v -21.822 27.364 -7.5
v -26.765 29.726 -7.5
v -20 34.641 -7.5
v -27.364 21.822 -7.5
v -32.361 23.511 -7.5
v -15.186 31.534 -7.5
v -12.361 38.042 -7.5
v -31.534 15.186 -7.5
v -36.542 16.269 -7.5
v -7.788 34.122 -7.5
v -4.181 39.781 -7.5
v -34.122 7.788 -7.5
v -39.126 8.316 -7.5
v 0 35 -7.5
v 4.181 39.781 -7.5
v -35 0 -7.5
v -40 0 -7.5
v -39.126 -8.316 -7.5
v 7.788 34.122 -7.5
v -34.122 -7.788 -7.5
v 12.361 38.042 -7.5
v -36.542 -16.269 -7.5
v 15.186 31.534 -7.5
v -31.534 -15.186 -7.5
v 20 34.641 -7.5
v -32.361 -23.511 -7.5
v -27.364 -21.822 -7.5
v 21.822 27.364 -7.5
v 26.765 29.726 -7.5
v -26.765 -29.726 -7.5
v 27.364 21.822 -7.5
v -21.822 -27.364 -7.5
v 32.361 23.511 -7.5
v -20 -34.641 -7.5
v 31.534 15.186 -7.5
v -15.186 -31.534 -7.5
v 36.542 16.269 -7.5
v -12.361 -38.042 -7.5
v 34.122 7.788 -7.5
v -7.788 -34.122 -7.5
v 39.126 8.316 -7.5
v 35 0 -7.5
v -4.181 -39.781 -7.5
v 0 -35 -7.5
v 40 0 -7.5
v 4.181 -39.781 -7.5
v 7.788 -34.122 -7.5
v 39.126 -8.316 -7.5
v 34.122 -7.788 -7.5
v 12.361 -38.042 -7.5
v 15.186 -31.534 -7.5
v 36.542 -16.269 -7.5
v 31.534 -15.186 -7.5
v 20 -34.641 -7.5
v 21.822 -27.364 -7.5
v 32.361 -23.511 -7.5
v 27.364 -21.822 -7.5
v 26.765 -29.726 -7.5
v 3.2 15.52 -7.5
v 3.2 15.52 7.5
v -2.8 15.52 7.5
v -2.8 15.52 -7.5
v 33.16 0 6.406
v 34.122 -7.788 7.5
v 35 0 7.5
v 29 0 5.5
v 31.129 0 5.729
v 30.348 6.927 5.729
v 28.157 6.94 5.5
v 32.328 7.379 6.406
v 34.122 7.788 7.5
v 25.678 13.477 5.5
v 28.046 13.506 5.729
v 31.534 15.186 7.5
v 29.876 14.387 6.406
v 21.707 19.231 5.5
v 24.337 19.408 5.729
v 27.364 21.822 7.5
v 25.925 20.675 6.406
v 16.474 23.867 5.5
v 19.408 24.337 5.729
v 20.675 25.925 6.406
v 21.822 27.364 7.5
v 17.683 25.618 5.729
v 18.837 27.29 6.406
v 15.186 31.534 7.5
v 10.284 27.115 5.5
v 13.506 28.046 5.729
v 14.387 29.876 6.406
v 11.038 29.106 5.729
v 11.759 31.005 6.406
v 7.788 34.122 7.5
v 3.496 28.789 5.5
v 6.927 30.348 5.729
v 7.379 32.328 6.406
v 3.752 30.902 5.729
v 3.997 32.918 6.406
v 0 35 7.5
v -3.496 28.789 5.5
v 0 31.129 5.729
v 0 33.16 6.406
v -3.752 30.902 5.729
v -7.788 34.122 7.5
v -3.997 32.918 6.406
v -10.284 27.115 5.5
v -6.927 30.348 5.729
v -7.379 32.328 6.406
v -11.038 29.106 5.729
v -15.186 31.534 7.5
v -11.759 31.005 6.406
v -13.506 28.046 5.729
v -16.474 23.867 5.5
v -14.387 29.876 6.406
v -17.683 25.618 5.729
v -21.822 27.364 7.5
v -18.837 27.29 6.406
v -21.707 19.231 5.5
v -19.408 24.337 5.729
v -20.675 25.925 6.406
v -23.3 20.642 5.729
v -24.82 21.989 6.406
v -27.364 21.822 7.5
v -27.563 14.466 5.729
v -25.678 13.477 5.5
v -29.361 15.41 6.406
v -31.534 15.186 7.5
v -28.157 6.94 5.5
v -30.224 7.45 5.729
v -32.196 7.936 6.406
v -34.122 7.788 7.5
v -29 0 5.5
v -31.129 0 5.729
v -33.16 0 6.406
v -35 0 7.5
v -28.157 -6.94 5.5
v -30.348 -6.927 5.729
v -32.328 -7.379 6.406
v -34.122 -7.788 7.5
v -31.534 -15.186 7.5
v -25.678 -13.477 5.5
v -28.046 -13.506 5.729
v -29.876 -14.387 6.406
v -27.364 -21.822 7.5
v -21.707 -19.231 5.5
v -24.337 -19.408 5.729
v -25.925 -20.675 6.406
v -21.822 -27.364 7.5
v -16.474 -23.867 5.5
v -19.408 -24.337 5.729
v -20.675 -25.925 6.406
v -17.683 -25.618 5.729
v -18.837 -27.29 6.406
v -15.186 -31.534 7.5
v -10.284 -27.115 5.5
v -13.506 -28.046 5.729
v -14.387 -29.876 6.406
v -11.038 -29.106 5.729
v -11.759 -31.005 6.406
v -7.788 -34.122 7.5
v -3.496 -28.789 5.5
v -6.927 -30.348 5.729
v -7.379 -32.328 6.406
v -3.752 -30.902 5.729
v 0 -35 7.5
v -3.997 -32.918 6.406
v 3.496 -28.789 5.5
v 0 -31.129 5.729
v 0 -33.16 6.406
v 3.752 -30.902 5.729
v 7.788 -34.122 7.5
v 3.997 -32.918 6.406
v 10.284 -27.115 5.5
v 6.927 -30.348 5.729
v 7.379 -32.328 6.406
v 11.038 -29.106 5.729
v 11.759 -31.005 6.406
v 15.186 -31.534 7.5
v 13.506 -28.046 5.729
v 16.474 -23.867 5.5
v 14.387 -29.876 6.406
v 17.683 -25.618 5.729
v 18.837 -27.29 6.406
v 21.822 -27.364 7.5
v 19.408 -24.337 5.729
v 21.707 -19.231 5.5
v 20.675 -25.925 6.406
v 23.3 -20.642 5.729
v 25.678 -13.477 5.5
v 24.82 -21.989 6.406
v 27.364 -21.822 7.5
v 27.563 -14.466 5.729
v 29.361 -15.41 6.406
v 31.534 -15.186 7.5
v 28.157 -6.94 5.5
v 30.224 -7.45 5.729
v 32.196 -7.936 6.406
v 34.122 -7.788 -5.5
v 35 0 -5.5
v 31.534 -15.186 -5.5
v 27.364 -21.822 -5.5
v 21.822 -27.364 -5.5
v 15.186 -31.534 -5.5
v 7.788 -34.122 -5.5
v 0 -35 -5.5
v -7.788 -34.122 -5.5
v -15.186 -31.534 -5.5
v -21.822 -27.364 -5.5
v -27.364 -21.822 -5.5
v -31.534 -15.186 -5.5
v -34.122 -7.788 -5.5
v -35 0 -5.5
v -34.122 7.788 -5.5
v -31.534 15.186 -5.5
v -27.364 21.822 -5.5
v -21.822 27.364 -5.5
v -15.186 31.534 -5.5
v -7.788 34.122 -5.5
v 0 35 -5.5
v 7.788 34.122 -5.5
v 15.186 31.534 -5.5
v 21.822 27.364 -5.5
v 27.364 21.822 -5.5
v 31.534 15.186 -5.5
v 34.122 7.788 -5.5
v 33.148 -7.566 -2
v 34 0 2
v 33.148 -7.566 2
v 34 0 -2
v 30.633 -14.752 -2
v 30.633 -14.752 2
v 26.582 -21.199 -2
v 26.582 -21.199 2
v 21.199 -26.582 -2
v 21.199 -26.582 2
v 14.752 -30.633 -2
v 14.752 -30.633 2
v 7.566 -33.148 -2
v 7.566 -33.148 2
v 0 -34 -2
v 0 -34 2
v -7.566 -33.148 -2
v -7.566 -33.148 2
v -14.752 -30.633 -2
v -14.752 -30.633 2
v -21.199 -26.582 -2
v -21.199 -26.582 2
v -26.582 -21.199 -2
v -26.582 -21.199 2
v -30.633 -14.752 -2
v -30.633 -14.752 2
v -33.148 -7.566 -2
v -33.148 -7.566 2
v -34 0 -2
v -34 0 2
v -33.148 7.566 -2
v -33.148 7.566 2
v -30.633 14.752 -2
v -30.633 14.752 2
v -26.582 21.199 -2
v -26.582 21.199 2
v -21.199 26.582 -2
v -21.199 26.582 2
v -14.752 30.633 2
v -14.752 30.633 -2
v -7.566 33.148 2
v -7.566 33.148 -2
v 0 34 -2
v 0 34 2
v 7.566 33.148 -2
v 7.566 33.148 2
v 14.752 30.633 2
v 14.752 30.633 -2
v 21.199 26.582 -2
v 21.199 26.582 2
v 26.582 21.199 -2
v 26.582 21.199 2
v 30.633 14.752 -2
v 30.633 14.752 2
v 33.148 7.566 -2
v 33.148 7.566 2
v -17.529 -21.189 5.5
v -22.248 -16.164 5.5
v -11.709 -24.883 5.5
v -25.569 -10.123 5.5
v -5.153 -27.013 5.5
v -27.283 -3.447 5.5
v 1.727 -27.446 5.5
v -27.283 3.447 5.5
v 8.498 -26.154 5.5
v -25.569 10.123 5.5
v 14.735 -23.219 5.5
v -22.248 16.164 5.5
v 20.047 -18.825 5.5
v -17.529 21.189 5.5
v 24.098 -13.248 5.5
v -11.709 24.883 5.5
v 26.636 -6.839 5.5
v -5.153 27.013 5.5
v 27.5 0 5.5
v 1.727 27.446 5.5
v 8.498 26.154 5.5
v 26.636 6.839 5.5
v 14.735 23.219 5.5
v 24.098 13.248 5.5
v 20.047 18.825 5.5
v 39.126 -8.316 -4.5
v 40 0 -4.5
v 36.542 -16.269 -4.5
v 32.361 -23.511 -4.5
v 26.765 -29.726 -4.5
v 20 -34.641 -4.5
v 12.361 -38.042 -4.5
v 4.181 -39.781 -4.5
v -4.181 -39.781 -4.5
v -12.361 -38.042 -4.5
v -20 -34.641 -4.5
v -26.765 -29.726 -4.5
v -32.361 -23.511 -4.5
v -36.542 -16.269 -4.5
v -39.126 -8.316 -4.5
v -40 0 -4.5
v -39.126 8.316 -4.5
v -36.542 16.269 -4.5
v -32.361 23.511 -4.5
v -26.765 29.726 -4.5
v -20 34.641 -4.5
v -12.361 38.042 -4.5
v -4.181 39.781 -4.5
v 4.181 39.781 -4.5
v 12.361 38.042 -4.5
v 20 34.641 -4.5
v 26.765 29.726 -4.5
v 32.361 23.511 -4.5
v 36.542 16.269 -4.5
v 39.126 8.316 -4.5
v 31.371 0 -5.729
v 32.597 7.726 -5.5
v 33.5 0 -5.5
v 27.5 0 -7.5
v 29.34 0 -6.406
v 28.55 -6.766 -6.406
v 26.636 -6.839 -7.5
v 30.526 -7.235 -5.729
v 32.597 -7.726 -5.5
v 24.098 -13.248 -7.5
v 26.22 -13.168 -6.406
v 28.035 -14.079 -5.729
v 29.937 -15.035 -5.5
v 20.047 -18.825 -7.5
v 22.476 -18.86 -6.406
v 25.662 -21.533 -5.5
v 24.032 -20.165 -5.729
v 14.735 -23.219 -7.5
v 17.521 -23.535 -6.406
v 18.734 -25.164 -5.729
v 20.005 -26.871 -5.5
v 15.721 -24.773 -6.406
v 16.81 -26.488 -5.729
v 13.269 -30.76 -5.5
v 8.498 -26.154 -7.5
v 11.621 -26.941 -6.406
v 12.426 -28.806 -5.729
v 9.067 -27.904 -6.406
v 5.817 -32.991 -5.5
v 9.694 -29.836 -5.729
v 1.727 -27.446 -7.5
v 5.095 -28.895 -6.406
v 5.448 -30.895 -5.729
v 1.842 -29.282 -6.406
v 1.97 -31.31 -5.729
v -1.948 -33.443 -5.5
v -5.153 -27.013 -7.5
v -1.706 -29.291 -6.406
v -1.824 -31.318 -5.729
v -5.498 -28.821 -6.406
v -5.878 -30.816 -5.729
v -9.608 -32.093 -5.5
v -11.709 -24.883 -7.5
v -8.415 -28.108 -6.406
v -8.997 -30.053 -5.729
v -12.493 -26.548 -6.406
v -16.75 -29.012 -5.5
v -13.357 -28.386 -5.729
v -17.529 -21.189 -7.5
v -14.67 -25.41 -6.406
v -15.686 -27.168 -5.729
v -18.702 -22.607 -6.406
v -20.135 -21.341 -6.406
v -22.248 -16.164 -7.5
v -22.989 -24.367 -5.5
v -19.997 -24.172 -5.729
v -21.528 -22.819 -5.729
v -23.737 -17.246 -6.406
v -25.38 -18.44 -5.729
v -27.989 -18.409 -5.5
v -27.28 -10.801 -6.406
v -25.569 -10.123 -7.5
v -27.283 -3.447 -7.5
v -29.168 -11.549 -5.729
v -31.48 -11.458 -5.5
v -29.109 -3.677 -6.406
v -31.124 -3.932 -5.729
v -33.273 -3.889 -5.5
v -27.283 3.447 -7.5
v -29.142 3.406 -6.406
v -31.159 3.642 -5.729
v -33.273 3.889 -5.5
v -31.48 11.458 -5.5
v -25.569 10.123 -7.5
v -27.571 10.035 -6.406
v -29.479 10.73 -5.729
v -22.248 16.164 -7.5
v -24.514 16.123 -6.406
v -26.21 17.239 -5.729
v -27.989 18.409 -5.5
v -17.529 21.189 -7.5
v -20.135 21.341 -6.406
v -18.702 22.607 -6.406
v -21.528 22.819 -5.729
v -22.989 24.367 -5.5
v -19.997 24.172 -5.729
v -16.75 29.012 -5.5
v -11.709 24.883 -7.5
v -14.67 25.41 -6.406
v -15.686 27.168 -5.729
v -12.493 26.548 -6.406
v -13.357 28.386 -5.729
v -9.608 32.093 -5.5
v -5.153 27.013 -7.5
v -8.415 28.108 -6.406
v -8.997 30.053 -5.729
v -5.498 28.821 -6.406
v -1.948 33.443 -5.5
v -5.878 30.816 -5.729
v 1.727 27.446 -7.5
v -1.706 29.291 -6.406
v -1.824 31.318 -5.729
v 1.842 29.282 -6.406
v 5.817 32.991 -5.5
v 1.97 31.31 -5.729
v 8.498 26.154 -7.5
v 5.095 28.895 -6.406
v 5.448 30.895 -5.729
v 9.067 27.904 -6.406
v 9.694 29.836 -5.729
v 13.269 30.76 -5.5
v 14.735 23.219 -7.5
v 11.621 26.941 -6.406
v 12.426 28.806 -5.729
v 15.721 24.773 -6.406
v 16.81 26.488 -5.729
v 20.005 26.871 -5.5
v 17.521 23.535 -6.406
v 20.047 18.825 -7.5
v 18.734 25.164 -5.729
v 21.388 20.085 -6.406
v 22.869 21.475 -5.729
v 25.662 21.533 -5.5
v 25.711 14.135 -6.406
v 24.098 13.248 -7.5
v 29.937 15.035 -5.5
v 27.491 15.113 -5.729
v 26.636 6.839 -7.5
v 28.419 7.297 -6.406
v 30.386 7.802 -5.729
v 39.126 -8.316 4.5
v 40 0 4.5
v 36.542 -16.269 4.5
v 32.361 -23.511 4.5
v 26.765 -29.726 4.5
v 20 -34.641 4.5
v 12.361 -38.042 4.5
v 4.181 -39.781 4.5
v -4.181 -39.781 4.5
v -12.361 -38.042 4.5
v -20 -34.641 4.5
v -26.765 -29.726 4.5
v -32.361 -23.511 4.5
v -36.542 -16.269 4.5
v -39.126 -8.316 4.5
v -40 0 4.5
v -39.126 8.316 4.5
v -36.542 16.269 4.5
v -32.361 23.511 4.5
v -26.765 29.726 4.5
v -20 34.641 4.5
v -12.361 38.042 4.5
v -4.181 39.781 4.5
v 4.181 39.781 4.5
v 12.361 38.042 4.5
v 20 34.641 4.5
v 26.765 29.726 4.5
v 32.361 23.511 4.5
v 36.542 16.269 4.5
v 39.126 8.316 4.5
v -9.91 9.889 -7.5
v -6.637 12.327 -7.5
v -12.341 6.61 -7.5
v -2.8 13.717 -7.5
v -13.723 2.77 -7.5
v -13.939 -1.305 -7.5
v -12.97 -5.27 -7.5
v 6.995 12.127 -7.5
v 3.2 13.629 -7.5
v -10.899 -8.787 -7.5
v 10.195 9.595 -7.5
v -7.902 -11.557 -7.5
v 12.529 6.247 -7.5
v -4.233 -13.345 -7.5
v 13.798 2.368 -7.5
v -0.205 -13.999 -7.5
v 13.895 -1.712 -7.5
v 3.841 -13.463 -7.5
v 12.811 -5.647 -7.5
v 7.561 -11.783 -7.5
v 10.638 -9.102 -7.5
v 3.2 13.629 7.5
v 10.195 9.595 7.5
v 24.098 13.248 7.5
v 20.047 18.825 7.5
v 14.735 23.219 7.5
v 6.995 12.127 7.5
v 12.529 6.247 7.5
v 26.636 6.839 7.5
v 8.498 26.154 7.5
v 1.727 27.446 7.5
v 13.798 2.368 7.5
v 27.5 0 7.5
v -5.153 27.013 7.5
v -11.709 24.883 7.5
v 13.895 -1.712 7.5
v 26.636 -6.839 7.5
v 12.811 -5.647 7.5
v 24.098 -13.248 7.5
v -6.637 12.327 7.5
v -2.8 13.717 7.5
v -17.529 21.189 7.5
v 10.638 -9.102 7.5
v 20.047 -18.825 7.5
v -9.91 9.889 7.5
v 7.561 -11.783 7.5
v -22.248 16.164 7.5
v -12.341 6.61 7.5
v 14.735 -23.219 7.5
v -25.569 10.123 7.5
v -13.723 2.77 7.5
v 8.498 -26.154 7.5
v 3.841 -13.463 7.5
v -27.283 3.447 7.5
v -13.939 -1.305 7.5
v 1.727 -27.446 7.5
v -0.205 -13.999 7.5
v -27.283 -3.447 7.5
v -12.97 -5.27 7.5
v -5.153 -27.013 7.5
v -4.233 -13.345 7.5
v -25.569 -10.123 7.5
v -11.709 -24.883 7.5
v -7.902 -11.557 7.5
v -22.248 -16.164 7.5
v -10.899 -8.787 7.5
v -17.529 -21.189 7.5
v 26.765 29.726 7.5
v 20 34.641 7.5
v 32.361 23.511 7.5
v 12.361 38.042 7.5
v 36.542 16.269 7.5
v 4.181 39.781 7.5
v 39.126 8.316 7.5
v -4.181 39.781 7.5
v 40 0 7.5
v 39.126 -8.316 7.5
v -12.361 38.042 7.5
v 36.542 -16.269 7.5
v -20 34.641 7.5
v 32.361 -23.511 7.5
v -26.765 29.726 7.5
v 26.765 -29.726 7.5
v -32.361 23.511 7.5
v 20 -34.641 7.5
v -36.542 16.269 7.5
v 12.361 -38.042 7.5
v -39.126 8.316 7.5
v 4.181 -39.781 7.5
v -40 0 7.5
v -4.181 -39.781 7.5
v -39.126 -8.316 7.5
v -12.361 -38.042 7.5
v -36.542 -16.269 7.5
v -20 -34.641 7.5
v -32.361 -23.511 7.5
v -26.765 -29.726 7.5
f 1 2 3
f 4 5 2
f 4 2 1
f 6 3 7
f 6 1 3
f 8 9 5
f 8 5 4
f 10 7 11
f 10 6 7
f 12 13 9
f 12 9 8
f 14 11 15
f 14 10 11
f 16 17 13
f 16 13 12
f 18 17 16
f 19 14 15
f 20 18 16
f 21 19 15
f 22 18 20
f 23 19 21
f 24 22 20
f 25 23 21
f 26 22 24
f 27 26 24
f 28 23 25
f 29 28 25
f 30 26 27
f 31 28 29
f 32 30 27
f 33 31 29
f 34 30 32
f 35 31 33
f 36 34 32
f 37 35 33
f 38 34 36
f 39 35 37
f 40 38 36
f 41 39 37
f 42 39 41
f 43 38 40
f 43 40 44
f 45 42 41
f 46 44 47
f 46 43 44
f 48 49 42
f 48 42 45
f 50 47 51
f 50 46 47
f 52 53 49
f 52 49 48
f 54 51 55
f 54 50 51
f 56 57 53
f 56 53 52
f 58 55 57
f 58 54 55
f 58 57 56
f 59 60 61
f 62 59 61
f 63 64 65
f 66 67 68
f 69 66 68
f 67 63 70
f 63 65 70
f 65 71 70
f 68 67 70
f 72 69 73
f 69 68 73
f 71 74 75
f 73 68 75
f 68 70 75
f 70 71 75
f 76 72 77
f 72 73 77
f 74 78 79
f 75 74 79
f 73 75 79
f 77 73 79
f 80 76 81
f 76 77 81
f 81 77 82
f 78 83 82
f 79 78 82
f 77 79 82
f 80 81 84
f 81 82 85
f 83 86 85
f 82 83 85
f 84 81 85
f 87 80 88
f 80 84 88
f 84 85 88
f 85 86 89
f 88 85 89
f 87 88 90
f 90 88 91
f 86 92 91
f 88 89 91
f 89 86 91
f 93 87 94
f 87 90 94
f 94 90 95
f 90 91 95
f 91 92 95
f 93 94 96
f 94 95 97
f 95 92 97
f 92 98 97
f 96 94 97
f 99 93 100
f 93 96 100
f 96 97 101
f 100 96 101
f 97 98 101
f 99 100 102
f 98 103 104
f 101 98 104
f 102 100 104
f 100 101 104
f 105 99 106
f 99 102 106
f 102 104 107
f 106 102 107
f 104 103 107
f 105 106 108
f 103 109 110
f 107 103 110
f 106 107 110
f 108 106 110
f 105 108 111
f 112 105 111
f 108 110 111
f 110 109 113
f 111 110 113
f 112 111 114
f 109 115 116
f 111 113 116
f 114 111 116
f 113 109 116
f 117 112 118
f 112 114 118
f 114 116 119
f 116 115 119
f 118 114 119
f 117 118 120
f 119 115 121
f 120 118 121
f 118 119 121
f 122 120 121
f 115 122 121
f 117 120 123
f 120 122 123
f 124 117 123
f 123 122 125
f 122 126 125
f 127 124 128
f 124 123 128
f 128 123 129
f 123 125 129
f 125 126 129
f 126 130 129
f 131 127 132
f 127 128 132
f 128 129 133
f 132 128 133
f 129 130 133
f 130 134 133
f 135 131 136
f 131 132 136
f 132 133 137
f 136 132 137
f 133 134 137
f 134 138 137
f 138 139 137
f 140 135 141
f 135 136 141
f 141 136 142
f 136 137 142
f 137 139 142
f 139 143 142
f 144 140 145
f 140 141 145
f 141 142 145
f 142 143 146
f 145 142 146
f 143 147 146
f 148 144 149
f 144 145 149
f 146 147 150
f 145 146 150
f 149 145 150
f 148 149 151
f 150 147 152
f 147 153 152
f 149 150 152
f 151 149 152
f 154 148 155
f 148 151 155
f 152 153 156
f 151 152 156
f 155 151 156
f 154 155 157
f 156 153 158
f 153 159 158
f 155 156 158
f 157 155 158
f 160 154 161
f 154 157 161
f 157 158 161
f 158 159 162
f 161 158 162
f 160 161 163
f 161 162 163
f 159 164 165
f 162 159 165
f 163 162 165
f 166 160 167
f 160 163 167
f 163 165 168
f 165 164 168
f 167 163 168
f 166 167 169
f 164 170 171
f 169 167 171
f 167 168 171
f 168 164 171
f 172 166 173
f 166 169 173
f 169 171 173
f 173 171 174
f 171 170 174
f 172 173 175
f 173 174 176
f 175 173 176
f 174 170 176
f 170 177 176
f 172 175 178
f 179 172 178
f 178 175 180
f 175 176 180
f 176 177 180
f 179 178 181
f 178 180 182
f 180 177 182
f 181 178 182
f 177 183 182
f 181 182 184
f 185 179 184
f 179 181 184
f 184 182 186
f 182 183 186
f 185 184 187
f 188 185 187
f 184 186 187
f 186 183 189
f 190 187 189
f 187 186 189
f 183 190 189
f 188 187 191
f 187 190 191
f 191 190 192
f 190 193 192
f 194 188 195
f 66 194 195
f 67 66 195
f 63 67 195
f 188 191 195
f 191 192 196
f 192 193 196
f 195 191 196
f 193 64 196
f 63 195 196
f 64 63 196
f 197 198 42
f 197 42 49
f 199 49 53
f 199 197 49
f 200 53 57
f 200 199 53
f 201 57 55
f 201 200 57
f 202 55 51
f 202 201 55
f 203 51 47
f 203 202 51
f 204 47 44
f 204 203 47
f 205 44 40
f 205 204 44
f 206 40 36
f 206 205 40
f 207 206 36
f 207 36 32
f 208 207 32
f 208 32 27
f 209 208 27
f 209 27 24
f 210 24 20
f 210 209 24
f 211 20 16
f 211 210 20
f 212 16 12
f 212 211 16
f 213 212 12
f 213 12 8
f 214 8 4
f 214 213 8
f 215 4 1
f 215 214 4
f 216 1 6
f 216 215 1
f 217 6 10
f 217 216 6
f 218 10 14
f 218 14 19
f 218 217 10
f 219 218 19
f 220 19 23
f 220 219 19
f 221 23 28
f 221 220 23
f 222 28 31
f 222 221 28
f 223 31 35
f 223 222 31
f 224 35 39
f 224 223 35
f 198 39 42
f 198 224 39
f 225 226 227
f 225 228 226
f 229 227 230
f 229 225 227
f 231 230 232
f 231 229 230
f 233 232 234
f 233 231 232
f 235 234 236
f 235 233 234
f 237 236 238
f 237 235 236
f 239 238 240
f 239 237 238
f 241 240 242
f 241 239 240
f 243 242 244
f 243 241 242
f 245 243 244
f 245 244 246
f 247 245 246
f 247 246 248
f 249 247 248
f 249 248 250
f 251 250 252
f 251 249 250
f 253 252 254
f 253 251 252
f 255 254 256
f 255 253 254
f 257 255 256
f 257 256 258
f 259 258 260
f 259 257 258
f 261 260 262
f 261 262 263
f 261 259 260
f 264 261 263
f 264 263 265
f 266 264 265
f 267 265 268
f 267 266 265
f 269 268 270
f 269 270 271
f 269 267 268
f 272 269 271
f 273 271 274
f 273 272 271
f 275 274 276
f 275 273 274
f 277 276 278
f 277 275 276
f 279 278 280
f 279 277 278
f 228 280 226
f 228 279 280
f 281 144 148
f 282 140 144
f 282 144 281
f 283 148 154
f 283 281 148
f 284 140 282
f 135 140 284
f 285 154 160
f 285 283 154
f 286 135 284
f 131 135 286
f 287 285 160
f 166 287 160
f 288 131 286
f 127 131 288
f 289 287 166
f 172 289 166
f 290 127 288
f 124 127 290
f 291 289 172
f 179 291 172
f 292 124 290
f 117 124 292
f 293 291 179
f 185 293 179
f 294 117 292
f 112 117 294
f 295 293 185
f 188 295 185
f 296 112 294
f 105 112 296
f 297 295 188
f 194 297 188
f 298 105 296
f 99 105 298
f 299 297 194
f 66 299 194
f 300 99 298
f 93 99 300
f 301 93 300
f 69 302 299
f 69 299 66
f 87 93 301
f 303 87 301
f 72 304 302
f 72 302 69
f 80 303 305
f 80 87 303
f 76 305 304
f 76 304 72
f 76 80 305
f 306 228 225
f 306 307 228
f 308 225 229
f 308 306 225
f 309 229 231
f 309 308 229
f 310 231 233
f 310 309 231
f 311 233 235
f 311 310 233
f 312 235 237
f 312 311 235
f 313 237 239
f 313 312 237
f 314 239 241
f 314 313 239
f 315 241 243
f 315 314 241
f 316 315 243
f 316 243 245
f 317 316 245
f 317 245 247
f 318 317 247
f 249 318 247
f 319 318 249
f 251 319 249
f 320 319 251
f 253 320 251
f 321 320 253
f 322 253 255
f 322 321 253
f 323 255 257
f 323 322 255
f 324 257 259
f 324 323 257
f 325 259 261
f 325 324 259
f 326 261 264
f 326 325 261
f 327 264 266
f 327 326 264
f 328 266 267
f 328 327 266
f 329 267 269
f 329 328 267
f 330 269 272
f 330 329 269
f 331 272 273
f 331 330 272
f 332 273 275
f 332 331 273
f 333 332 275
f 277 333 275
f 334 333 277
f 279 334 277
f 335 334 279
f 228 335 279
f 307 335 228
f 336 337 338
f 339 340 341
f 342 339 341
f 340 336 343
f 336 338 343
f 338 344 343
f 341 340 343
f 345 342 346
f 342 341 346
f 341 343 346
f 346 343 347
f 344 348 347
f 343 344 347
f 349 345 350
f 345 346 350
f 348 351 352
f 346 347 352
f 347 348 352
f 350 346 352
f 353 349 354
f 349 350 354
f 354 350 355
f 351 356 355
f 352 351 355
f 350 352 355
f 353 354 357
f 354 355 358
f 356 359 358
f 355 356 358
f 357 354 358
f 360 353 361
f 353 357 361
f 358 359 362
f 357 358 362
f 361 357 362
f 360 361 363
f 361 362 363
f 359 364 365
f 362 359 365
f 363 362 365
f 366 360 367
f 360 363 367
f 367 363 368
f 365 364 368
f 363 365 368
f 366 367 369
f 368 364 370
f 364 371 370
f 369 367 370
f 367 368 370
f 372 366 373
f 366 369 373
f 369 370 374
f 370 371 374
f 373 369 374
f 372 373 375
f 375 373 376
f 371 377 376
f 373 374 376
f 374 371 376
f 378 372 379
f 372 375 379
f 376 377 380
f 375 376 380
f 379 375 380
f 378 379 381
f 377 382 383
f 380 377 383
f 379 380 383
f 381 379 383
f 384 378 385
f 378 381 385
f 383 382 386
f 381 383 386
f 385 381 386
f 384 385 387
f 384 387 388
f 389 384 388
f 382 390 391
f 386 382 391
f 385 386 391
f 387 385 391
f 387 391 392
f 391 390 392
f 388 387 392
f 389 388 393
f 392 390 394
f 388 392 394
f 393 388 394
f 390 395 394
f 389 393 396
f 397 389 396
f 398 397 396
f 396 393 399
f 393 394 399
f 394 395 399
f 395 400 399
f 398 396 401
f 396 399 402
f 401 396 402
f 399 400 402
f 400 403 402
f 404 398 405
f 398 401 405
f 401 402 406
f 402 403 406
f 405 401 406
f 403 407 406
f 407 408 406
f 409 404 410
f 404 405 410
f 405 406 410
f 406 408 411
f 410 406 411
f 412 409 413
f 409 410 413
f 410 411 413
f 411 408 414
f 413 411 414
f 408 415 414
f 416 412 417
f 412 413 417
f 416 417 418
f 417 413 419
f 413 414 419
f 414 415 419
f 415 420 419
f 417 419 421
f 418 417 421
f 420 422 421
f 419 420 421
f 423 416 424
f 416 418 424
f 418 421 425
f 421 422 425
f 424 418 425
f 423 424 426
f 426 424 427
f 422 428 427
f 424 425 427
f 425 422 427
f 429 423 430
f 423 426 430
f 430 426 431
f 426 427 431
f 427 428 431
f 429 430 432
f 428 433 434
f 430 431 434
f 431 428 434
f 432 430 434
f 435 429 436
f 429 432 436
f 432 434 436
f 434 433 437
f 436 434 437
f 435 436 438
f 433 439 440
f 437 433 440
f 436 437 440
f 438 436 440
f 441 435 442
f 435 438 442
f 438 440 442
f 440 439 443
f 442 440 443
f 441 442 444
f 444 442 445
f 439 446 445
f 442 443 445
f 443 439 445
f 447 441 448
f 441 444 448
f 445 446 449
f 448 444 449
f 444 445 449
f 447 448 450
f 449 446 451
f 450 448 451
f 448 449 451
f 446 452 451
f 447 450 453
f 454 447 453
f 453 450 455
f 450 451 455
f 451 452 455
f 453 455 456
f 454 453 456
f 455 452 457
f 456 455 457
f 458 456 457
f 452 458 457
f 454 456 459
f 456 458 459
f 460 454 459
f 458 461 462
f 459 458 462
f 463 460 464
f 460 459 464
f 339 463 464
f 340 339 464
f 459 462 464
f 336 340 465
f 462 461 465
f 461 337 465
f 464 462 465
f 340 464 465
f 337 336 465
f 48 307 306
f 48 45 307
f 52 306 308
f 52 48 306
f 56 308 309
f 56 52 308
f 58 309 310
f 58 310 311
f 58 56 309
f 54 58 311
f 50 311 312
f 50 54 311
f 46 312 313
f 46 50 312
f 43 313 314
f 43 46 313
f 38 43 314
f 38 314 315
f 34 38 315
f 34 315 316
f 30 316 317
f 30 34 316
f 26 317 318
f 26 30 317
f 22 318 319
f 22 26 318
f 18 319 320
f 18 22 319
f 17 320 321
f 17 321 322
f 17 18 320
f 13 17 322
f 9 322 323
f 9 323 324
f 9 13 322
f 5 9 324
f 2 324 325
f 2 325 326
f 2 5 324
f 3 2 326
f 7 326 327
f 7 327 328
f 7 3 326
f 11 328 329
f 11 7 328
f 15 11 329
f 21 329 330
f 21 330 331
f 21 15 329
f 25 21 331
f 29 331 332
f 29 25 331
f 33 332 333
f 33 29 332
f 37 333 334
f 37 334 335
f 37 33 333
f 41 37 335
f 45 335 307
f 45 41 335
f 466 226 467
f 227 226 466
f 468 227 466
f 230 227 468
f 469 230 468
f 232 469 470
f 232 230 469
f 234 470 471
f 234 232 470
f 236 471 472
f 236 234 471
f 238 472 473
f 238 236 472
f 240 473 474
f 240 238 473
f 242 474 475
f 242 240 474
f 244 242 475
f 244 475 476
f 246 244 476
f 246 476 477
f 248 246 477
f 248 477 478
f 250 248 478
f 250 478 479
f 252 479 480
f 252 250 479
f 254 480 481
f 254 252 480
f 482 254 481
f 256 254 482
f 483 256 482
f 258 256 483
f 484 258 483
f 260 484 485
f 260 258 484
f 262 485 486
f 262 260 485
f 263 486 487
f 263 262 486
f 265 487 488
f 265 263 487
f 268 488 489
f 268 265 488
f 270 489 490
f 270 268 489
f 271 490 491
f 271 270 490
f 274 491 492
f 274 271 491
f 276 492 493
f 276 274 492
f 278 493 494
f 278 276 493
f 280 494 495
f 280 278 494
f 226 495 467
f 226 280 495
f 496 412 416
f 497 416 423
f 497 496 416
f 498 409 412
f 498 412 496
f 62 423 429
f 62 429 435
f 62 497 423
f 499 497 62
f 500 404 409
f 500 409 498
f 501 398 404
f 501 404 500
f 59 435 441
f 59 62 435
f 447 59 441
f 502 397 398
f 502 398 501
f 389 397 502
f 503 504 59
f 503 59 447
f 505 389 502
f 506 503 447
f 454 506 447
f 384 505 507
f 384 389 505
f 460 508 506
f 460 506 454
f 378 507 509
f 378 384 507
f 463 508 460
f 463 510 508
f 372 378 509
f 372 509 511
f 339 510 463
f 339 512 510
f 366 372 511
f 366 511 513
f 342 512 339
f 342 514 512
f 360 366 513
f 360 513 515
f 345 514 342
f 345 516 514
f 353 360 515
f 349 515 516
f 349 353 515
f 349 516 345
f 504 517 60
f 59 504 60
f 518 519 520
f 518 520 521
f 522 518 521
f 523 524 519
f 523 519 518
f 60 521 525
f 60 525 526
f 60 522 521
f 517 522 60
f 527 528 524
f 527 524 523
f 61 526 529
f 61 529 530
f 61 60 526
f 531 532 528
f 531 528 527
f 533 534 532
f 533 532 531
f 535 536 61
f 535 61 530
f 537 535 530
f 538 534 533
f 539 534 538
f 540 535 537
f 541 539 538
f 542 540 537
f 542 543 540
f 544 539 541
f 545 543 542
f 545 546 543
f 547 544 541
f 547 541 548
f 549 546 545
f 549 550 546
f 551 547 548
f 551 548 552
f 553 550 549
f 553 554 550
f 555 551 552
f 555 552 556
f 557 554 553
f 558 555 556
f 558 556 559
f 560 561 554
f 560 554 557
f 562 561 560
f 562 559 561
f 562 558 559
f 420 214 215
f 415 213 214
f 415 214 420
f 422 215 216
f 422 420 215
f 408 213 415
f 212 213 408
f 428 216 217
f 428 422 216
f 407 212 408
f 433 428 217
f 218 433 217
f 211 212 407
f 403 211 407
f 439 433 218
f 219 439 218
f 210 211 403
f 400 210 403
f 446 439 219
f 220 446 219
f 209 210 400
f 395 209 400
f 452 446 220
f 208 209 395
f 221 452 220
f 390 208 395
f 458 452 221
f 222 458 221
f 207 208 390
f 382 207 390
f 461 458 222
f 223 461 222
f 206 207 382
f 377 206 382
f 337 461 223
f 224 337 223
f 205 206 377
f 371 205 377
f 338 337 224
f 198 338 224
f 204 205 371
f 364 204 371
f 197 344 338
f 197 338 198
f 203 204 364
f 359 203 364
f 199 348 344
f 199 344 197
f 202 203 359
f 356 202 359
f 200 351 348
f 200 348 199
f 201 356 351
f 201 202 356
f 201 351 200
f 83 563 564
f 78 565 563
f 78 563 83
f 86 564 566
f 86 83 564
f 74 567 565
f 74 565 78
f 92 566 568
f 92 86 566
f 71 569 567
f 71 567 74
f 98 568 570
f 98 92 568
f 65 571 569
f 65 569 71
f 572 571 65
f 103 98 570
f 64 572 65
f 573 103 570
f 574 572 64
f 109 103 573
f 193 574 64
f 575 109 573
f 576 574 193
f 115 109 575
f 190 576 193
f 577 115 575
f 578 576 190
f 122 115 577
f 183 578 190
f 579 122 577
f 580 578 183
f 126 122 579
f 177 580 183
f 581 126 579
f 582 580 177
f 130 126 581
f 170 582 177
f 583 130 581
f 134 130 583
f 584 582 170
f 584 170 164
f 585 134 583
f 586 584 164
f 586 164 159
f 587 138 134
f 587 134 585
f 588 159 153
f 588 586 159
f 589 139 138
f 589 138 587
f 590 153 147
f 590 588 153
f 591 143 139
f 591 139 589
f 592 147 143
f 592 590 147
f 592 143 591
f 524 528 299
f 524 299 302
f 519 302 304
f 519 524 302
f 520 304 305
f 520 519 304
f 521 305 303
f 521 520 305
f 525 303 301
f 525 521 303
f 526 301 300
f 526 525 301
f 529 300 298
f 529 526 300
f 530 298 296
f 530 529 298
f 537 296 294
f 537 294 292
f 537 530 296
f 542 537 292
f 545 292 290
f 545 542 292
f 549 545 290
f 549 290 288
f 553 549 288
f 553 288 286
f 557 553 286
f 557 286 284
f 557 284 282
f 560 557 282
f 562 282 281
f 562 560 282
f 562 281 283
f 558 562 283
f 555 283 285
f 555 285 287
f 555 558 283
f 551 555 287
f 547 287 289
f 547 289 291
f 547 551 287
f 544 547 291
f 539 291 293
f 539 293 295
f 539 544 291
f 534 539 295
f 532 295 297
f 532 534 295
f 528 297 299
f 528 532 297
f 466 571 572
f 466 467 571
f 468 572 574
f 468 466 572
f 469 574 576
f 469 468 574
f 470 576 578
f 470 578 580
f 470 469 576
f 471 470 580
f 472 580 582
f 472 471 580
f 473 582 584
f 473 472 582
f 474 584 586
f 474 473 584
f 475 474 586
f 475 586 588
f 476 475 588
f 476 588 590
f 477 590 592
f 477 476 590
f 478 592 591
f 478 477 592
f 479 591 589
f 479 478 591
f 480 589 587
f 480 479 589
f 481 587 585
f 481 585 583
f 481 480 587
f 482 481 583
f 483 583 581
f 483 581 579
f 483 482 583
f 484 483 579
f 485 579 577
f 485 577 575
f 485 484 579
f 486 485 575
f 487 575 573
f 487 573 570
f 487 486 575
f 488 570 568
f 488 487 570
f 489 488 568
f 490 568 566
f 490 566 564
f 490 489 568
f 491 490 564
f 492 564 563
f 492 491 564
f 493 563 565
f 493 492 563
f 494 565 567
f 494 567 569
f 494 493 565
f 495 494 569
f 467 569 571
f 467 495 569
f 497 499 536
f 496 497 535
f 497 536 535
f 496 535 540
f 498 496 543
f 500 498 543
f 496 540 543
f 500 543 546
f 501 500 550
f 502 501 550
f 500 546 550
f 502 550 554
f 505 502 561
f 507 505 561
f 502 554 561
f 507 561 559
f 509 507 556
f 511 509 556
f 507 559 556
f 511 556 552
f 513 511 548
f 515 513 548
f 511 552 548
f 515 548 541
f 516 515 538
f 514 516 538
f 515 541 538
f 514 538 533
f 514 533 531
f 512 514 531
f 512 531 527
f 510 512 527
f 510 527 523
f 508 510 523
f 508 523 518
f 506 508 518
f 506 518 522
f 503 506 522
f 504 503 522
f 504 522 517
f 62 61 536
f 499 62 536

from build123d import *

# Parameters (mm, degrees)
CUT_EXTRUDE1_DEPTH = 59.523499554
SKETCH3_R          = 35
SKETCH3_R_2        = 27.5
CUT_EXTRUDE2_DEPTH = 2
CUT_EXTRUDE3_START = -2
SKETCH4_R          = 35
SKETCH4_R_2        = 27.5
CUT_EXTRUDE3_DEPTH = 2
FILLET1_R          = 10
FILLET2_R          = 10


with BuildPart() as part:
    # Sketch1 → Revolve1 (revolve)
    with BuildSketch(Plane(origin=(0, 0, 0), x_dir=(0, 0, -1), z_dir=(1, 0, 0)), mode=Mode.PRIVATE) as revolve1_sk:
        Polygon((-7.5, 40), (-4.5, 40), (-2, 34), (2, 34), (4.5, 40), (7.5, 40), (7.5, 0), (-7.5, 0), align=None)
    revolve(revolve1_sk.sketch.rotate(Axis((0, 0, 652.003718611), (0, 0, -1)), 90), axis=Axis((0, 0, 652.003718611), (0, 0, -1)))

    # Sketch2 → Cut-Extrude1 (cut, through all)
    with BuildSketch(Plane.XY.offset(7.5)):
        with BuildLine():
            Line((3.2, 15.520204103), (-2.8, 15.520204103))
            Line((-2.8, 15.520204103), (-2.8, 13.71714256))
            ThreePointArc((-2.8, 13.71714256), (-0.204757333, -13.998502578), (3.2, 13.62938003))
            Line((3.2, 13.62938003), (3.2, 15.520204103))
        make_face()
    extrude(amount=-CUT_EXTRUDE1_DEPTH, mode=Mode.SUBTRACT)

    # Sketch3 → Cut-Extrude2 (cut)
    with BuildSketch(Plane.XY.offset(7.5)):
        Circle(SKETCH3_R)
        Circle(SKETCH3_R_2, mode=Mode.SUBTRACT)
    extrude(amount=-CUT_EXTRUDE2_DEPTH, mode=Mode.SUBTRACT)

    # Sketch4 → Cut-Extrude3 (cut)
    with BuildSketch(Plane(origin=(0, 0, -7.5), x_dir=(-1, 0, 0), z_dir=(0, 0, -1)).offset(CUT_EXTRUDE3_START)):
        with Locations(Location((0, 0, 0), (0, 0, 180))):
            Circle(SKETCH4_R)
        with Locations(Location((0, 0, 0), (0, 0, 180))):
            Circle(SKETCH4_R_2, mode=Mode.SUBTRACT)
    extrude(amount=CUT_EXTRUDE3_DEPTH, mode=Mode.SUBTRACT)

    # Fillet1
    # the kernel refuses this fillet: 10 mm, written as the material it adds along each edge
    with BuildSketch(Plane(origin=(0, 0, 5.5), x_dir=(1, 0, 0), z_dir=(0, -1, 0))) as fillet1_piece_1:
        with BuildLine():
            CenterArc((29, 10), FILLET1_R, 270, 36.869897646)
            Line((29, 0), (29, -0.2))
            Line((29, -0.2), (35, -0.2))
            Line((35, -0.2), (35.2, 0))
            ThreePointArc((35.2, 0), (35.2, 1), (35.12, 1.84))
            Line((35.12, 1.84), (35, 2))
        make_face()
    revolve(axis=Axis((0, 0, 5.5), (0, 0, 1)))

    # Fillet2
    # the kernel refuses this fillet: 10 mm, written as the material it adds along each edge
    with BuildSketch(Plane(origin=(0, 0, -5.5), x_dir=(1, 0, 0), z_dir=(0, 1, 0))) as fillet2_piece_1:
        with BuildLine():
            CenterArc((33.5, 10), FILLET2_R, 233.130102354, 36.869897646)
            Line((33.5, 0), (33.5, -0.2))
            Line((33.5, -0.2), (27.5, -0.2))
            Line((27.5, -0.2), (27.3, 0))
            ThreePointArc((27.3, 0), (27.3, 1), (27.38, 1.84))
            Line((27.38, 1.84), (27.5, 2))
        make_face()
    revolve(axis=Axis((0, 0, -5.5), (0, 0, -1)))


solid = part.part
